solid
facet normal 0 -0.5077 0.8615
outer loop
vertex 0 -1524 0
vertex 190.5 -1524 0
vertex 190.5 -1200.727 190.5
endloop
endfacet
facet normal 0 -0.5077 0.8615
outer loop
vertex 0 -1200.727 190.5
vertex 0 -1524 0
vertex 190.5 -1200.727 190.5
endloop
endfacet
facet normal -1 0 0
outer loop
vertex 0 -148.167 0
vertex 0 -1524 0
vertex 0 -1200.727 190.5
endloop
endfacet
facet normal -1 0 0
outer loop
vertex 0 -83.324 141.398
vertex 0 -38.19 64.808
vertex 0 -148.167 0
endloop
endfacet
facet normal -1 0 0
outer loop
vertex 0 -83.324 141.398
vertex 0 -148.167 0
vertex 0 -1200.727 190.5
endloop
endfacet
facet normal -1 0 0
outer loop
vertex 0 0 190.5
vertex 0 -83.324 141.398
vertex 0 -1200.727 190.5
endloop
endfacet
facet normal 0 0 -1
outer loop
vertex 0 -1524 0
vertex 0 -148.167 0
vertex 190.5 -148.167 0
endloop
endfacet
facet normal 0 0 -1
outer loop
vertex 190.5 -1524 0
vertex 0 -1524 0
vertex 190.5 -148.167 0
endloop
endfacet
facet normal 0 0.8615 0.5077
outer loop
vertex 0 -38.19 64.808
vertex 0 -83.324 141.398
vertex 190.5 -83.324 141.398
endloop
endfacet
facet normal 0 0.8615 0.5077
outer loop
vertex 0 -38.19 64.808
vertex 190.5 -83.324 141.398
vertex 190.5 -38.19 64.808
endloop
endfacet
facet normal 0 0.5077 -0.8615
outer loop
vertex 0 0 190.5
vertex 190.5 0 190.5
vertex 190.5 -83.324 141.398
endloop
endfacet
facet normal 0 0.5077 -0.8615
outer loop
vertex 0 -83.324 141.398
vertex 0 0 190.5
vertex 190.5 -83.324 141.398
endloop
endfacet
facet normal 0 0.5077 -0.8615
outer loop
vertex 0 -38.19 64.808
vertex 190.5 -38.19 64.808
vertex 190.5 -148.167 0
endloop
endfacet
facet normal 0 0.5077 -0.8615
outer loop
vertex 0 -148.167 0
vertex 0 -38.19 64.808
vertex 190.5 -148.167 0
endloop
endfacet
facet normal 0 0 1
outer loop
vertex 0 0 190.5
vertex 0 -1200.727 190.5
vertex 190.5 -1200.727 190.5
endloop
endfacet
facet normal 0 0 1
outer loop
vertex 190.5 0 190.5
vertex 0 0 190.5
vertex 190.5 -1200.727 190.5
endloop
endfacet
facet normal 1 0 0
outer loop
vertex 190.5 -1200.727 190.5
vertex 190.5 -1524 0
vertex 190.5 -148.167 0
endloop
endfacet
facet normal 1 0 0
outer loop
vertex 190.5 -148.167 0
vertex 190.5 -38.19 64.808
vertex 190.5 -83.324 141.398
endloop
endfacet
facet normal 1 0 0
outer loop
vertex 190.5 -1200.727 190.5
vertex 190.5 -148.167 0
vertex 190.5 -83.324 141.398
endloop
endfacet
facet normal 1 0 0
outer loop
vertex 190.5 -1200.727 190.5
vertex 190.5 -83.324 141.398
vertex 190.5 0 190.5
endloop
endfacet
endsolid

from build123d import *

# Parameters (mm, degrees)
F0_W     = 190.5
F0_H     = 190.5
F1_DEPTH = 1524
F3_DEPTH = 190.501
F5_DEPTH = 190.501


with BuildPart() as f1:
    # F0 (on Front) → F1 (new body)
    with BuildSketch(Plane.XZ):
        with Locations((95.25, 95.25)):
            Rectangle(F0_W, F0_H)
    extrude(amount=F1_DEPTH)

    # F2 (on face) → F3 (cut, through all)
    with BuildSketch(Plane.YZ.offset(190.5)):
        Polygon((-1524, 190.5), (-1524, 0), (-1200.727273, 190.5), align=None)
        Polygon((-83.324024, 141.398343), (0, 0), (0, 190.5), align=None)
    extrude(amount=-F3_DEPTH, mode=Mode.SUBTRACT)

    # F4 (on face) → F5 (cut, through all)
    with BuildSketch(Plane.YZ.offset(190.5)):
        Polygon((0, 0), (-38.190178, 64.807574), (-148.166667, 0), align=None)
    extrude(amount=-F5_DEPTH, mode=Mode.SUBTRACT)


solid = f1.part
